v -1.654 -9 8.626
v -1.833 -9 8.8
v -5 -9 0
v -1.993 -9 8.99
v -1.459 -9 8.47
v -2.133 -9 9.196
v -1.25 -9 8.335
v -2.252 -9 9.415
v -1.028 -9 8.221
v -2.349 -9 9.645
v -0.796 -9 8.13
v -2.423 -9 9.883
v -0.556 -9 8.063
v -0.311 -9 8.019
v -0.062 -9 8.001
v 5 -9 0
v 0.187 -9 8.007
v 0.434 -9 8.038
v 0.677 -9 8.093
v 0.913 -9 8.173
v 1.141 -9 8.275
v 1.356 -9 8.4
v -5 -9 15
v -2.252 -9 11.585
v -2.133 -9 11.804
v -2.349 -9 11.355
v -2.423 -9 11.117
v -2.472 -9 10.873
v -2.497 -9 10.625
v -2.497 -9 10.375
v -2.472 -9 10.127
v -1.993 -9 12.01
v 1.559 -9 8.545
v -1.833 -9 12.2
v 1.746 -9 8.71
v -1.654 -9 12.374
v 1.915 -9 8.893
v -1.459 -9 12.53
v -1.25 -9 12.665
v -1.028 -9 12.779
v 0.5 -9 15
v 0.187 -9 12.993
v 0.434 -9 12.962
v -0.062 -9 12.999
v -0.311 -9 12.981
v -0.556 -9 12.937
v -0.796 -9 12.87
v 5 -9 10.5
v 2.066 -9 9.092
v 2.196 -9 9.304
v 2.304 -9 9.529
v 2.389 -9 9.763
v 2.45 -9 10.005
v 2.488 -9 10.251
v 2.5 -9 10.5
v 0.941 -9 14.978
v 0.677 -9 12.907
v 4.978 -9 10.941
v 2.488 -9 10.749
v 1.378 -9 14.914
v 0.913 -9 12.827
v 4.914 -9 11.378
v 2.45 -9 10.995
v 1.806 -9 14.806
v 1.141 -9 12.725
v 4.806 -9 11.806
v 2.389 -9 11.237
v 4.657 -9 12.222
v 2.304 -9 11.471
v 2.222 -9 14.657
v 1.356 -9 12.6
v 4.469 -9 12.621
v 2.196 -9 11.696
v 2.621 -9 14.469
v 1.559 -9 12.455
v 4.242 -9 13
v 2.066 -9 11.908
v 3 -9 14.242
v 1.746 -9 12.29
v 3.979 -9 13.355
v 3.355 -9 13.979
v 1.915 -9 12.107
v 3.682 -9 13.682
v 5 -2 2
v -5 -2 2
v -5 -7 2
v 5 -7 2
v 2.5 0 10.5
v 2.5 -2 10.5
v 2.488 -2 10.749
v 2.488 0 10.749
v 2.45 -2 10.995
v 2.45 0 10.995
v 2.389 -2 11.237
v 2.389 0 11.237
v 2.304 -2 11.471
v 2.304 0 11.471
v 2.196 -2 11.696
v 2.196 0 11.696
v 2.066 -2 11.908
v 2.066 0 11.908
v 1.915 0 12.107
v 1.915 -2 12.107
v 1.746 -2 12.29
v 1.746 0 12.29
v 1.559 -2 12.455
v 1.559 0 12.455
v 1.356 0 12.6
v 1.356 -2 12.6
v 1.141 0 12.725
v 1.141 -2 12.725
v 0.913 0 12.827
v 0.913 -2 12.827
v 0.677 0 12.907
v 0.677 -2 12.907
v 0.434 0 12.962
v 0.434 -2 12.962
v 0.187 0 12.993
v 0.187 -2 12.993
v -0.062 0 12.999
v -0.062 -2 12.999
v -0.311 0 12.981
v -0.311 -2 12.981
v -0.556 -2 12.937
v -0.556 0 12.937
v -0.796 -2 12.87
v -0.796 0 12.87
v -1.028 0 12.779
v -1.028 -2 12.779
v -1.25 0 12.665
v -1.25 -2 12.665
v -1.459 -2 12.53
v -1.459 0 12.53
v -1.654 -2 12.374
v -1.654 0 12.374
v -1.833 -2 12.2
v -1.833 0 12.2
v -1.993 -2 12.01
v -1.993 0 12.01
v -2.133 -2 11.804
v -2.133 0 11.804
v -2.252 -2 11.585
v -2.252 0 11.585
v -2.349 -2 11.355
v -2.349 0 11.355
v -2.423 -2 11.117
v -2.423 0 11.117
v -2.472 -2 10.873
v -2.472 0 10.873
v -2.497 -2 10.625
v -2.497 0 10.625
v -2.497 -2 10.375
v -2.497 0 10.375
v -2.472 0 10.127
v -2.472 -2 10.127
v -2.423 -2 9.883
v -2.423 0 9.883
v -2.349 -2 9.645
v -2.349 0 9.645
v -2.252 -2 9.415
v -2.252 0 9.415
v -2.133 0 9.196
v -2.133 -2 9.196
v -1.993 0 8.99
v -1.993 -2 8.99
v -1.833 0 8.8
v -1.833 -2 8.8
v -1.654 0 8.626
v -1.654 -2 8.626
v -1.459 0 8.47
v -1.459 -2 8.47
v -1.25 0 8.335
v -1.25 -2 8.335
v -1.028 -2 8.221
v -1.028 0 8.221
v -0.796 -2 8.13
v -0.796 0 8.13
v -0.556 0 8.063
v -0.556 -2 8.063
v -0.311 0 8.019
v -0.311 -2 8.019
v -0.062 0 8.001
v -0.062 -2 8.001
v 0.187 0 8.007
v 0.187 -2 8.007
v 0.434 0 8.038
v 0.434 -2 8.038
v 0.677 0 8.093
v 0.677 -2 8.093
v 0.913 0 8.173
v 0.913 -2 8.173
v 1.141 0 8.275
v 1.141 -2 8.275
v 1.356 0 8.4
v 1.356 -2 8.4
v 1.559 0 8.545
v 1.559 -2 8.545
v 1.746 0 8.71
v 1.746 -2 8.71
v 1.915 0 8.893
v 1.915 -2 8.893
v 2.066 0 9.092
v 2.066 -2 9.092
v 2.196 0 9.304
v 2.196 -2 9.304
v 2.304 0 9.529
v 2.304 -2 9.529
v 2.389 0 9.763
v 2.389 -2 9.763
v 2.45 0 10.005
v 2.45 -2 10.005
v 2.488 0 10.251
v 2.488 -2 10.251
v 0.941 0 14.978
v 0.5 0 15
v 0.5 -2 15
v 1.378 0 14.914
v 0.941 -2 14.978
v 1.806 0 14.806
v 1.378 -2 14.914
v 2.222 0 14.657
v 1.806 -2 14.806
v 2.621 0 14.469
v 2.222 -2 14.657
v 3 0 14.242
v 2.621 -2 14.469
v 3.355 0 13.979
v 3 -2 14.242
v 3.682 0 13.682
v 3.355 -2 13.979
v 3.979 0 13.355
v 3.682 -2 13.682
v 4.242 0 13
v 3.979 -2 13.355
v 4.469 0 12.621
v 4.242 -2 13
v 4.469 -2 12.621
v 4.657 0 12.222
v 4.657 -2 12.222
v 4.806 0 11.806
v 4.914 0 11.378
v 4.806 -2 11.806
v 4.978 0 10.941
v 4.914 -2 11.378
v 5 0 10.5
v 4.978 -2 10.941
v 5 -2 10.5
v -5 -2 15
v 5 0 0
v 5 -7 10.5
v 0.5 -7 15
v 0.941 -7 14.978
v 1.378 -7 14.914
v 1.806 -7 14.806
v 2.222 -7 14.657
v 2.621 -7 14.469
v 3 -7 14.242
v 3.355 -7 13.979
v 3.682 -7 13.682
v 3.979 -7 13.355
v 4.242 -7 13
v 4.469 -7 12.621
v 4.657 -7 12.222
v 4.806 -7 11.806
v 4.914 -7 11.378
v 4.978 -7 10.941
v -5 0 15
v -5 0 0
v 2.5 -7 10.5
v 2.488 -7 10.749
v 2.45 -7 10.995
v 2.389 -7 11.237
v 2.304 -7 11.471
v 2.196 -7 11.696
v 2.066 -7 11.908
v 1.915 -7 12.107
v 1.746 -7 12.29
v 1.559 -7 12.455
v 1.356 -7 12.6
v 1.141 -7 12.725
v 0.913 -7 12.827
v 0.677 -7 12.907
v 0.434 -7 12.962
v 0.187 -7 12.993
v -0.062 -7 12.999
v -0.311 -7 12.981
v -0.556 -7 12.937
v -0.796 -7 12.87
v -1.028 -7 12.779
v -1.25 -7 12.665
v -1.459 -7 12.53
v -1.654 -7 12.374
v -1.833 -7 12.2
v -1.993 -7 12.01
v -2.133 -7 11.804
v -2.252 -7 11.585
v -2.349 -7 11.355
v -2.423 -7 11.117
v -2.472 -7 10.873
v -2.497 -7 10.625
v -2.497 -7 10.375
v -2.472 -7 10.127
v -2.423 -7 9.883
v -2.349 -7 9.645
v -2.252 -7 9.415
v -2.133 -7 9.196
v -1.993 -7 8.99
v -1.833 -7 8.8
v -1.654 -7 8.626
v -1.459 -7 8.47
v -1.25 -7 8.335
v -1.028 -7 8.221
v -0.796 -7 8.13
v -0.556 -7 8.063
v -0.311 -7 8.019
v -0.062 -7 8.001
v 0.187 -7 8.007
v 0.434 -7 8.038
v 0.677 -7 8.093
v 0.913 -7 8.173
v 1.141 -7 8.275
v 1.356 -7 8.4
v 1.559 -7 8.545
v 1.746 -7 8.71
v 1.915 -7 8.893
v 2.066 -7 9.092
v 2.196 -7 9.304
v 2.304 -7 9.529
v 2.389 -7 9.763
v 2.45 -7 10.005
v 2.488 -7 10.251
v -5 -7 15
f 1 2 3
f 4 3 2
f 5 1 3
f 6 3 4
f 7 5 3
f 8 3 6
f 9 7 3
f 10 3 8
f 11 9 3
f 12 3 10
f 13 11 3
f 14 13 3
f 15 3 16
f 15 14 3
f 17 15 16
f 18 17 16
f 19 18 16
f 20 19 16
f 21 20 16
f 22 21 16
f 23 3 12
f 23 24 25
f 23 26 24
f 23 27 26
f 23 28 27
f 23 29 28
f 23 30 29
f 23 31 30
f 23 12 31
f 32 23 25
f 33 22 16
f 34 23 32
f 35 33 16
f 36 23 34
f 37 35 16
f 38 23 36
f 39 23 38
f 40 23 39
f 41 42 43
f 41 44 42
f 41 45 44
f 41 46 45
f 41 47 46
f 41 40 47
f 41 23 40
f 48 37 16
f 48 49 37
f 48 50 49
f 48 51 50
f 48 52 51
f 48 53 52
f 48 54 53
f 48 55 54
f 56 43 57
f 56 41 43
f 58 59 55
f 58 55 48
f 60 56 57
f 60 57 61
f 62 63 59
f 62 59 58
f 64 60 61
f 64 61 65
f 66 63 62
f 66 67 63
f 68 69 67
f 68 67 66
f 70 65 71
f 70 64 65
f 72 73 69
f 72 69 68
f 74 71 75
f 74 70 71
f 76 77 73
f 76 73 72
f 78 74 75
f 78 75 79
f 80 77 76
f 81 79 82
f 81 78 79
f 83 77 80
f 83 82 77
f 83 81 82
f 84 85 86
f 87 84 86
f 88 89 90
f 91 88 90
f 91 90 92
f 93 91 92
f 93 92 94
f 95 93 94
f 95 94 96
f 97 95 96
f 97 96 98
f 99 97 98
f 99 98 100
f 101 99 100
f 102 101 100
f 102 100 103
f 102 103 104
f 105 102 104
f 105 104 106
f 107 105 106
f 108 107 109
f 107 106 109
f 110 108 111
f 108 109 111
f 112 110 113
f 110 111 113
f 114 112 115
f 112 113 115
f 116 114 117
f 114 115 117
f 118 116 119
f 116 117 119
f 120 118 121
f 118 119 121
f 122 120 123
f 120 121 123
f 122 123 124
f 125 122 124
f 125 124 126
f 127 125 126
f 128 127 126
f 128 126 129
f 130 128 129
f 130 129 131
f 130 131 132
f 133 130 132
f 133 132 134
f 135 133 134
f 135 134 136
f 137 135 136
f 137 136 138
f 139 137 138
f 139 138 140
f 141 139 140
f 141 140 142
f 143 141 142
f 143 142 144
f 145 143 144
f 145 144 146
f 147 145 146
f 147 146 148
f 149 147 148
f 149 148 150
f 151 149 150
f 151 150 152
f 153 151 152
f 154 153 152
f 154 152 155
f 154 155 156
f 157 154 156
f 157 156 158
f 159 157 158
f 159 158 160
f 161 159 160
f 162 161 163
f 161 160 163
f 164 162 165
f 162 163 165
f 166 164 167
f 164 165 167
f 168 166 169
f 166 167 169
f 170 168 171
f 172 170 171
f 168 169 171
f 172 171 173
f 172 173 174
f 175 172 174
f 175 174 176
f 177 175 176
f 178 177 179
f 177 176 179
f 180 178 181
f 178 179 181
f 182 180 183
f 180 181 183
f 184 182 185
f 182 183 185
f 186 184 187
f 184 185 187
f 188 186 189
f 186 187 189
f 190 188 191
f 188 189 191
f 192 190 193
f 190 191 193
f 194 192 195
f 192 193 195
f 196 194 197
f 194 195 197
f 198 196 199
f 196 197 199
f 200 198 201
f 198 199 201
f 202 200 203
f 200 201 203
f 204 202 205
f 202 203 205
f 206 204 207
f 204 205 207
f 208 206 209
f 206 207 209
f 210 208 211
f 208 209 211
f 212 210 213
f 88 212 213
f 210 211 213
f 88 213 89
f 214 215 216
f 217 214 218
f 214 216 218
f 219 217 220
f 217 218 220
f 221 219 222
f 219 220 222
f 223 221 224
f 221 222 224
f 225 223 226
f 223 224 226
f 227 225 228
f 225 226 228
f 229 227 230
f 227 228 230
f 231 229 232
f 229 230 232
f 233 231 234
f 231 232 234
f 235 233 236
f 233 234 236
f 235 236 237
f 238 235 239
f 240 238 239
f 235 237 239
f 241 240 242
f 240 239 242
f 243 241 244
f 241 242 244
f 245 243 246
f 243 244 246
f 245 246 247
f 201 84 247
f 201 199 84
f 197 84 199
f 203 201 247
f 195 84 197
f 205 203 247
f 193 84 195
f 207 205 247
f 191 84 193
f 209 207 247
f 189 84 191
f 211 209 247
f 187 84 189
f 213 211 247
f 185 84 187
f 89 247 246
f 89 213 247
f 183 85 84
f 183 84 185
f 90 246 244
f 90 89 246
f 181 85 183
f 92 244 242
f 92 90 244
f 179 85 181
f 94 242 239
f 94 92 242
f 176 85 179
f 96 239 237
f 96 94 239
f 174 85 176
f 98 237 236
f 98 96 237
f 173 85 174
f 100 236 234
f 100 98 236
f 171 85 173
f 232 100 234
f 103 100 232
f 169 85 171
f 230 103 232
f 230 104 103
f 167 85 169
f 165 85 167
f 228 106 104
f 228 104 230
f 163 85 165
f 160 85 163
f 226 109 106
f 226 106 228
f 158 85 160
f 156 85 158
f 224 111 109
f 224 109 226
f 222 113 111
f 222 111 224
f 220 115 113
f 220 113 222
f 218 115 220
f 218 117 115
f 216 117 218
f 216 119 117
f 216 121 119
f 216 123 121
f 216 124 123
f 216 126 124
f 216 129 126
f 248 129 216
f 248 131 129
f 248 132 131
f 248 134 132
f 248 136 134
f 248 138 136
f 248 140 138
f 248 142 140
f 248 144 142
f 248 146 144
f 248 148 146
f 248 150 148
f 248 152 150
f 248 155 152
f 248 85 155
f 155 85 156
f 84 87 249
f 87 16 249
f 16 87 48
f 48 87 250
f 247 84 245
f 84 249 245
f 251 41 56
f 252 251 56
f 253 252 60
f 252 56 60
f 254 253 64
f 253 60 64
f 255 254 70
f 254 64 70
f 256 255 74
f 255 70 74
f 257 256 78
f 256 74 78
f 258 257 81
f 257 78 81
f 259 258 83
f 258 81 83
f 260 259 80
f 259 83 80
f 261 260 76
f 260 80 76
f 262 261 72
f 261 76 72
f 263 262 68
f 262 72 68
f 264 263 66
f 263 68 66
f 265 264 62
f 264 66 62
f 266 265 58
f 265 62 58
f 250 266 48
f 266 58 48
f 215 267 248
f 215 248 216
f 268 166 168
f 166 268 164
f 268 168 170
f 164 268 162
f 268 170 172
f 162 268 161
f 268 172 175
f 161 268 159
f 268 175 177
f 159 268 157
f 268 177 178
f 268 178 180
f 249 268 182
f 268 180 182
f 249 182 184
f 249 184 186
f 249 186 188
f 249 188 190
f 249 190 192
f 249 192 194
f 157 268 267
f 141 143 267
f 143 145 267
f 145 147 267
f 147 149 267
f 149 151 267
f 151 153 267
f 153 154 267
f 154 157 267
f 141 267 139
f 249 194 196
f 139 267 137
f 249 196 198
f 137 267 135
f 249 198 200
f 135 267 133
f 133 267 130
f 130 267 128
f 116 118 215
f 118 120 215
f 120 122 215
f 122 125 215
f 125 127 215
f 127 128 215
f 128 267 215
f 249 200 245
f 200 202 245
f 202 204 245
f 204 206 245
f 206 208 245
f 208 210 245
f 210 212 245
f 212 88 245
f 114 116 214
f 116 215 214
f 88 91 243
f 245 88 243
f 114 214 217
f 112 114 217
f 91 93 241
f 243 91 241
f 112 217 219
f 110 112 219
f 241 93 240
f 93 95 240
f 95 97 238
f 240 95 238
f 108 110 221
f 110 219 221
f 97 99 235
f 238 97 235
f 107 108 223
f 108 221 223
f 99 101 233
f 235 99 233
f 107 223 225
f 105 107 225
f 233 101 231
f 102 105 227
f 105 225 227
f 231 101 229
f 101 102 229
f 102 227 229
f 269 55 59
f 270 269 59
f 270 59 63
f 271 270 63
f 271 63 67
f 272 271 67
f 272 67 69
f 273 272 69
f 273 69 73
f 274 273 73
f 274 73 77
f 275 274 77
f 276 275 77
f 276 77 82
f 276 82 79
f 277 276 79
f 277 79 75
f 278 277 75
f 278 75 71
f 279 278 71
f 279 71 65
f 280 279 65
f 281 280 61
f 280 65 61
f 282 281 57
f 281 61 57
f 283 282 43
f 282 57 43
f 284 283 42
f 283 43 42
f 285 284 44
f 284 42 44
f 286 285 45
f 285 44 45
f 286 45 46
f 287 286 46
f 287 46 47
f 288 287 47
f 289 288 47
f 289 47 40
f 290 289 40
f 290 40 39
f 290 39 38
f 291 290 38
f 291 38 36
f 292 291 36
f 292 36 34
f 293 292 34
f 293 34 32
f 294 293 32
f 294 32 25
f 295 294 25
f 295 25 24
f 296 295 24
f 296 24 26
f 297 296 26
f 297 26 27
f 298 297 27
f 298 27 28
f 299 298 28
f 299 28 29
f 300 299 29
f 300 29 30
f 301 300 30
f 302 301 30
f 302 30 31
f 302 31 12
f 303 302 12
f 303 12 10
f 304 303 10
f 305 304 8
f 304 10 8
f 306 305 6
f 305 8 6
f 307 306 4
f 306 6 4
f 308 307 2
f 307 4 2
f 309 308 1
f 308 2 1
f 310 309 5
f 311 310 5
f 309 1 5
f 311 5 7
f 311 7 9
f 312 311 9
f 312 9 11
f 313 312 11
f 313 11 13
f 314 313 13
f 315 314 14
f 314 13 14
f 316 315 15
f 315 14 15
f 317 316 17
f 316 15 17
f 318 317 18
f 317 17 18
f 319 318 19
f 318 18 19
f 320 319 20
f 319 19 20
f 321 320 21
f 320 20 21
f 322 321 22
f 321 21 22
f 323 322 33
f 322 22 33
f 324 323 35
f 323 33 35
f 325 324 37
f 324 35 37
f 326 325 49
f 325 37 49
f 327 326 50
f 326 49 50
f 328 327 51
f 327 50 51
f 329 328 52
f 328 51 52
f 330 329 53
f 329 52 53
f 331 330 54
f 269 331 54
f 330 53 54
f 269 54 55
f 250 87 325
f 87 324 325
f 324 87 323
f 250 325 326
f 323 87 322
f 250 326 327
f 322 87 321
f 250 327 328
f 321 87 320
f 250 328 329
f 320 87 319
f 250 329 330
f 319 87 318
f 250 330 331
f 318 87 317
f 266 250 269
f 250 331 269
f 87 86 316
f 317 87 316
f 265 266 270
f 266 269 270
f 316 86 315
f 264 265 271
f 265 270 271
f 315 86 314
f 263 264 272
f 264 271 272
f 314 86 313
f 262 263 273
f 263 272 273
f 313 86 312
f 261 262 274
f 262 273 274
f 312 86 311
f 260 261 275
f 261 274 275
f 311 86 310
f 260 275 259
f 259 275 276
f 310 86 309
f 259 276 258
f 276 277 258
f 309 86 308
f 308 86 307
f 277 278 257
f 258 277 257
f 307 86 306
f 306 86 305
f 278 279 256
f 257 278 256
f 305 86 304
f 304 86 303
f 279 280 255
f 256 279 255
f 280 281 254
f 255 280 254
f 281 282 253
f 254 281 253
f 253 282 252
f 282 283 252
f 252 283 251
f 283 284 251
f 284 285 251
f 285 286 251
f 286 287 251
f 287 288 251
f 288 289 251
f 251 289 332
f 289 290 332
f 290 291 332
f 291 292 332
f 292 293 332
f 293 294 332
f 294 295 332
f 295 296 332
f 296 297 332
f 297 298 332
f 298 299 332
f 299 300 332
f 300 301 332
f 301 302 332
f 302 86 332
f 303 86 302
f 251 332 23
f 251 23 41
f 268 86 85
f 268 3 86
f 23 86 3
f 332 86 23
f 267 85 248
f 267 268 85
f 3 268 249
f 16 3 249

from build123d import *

# Parameters (mm, degrees)
F4_W      = 10
F4_H      = 15
F5_DEPTH  = 9
F6_R      = 2.5
F7_DEPTH  = 9.001
F8_R      = 4.5
F9_W      = 5
F9_H      = 13
F10_DEPTH = 10.001


with BuildPart() as f5:
    # F4 (on Front) → F5 (new body)
    with BuildSketch(Plane.XZ):
        with Locations((0, 7.5)):
            Rectangle(F4_W, F4_H)
    extrude(amount=F5_DEPTH)

    # F6 (on face) → F7 (cut, through all)
    with BuildSketch(Plane.XZ.offset(9)):
        with Locations((0, 10.5)):
            Circle(F6_R)
    extrude(amount=-F7_DEPTH, mode=Mode.SUBTRACT)

    # F8
    f8_edges = [f5.edges().sort_by_distance(p)[0] for p in [
        (5, -4.5, 15),
    ]]
    fillet(f8_edges, radius=F8_R)

    # F9 (on face) → F10 (cut, through all)
    with BuildSketch(Plane(origin=(-5, 0, 0), x_dir=(0, -1, 0), z_dir=(-1, 0, 0))):
        with Locations((4.5, 8.5)):
            Rectangle(F9_W, F9_H)
    extrude(amount=-F10_DEPTH, mode=Mode.SUBTRACT)


solid = f5.part
